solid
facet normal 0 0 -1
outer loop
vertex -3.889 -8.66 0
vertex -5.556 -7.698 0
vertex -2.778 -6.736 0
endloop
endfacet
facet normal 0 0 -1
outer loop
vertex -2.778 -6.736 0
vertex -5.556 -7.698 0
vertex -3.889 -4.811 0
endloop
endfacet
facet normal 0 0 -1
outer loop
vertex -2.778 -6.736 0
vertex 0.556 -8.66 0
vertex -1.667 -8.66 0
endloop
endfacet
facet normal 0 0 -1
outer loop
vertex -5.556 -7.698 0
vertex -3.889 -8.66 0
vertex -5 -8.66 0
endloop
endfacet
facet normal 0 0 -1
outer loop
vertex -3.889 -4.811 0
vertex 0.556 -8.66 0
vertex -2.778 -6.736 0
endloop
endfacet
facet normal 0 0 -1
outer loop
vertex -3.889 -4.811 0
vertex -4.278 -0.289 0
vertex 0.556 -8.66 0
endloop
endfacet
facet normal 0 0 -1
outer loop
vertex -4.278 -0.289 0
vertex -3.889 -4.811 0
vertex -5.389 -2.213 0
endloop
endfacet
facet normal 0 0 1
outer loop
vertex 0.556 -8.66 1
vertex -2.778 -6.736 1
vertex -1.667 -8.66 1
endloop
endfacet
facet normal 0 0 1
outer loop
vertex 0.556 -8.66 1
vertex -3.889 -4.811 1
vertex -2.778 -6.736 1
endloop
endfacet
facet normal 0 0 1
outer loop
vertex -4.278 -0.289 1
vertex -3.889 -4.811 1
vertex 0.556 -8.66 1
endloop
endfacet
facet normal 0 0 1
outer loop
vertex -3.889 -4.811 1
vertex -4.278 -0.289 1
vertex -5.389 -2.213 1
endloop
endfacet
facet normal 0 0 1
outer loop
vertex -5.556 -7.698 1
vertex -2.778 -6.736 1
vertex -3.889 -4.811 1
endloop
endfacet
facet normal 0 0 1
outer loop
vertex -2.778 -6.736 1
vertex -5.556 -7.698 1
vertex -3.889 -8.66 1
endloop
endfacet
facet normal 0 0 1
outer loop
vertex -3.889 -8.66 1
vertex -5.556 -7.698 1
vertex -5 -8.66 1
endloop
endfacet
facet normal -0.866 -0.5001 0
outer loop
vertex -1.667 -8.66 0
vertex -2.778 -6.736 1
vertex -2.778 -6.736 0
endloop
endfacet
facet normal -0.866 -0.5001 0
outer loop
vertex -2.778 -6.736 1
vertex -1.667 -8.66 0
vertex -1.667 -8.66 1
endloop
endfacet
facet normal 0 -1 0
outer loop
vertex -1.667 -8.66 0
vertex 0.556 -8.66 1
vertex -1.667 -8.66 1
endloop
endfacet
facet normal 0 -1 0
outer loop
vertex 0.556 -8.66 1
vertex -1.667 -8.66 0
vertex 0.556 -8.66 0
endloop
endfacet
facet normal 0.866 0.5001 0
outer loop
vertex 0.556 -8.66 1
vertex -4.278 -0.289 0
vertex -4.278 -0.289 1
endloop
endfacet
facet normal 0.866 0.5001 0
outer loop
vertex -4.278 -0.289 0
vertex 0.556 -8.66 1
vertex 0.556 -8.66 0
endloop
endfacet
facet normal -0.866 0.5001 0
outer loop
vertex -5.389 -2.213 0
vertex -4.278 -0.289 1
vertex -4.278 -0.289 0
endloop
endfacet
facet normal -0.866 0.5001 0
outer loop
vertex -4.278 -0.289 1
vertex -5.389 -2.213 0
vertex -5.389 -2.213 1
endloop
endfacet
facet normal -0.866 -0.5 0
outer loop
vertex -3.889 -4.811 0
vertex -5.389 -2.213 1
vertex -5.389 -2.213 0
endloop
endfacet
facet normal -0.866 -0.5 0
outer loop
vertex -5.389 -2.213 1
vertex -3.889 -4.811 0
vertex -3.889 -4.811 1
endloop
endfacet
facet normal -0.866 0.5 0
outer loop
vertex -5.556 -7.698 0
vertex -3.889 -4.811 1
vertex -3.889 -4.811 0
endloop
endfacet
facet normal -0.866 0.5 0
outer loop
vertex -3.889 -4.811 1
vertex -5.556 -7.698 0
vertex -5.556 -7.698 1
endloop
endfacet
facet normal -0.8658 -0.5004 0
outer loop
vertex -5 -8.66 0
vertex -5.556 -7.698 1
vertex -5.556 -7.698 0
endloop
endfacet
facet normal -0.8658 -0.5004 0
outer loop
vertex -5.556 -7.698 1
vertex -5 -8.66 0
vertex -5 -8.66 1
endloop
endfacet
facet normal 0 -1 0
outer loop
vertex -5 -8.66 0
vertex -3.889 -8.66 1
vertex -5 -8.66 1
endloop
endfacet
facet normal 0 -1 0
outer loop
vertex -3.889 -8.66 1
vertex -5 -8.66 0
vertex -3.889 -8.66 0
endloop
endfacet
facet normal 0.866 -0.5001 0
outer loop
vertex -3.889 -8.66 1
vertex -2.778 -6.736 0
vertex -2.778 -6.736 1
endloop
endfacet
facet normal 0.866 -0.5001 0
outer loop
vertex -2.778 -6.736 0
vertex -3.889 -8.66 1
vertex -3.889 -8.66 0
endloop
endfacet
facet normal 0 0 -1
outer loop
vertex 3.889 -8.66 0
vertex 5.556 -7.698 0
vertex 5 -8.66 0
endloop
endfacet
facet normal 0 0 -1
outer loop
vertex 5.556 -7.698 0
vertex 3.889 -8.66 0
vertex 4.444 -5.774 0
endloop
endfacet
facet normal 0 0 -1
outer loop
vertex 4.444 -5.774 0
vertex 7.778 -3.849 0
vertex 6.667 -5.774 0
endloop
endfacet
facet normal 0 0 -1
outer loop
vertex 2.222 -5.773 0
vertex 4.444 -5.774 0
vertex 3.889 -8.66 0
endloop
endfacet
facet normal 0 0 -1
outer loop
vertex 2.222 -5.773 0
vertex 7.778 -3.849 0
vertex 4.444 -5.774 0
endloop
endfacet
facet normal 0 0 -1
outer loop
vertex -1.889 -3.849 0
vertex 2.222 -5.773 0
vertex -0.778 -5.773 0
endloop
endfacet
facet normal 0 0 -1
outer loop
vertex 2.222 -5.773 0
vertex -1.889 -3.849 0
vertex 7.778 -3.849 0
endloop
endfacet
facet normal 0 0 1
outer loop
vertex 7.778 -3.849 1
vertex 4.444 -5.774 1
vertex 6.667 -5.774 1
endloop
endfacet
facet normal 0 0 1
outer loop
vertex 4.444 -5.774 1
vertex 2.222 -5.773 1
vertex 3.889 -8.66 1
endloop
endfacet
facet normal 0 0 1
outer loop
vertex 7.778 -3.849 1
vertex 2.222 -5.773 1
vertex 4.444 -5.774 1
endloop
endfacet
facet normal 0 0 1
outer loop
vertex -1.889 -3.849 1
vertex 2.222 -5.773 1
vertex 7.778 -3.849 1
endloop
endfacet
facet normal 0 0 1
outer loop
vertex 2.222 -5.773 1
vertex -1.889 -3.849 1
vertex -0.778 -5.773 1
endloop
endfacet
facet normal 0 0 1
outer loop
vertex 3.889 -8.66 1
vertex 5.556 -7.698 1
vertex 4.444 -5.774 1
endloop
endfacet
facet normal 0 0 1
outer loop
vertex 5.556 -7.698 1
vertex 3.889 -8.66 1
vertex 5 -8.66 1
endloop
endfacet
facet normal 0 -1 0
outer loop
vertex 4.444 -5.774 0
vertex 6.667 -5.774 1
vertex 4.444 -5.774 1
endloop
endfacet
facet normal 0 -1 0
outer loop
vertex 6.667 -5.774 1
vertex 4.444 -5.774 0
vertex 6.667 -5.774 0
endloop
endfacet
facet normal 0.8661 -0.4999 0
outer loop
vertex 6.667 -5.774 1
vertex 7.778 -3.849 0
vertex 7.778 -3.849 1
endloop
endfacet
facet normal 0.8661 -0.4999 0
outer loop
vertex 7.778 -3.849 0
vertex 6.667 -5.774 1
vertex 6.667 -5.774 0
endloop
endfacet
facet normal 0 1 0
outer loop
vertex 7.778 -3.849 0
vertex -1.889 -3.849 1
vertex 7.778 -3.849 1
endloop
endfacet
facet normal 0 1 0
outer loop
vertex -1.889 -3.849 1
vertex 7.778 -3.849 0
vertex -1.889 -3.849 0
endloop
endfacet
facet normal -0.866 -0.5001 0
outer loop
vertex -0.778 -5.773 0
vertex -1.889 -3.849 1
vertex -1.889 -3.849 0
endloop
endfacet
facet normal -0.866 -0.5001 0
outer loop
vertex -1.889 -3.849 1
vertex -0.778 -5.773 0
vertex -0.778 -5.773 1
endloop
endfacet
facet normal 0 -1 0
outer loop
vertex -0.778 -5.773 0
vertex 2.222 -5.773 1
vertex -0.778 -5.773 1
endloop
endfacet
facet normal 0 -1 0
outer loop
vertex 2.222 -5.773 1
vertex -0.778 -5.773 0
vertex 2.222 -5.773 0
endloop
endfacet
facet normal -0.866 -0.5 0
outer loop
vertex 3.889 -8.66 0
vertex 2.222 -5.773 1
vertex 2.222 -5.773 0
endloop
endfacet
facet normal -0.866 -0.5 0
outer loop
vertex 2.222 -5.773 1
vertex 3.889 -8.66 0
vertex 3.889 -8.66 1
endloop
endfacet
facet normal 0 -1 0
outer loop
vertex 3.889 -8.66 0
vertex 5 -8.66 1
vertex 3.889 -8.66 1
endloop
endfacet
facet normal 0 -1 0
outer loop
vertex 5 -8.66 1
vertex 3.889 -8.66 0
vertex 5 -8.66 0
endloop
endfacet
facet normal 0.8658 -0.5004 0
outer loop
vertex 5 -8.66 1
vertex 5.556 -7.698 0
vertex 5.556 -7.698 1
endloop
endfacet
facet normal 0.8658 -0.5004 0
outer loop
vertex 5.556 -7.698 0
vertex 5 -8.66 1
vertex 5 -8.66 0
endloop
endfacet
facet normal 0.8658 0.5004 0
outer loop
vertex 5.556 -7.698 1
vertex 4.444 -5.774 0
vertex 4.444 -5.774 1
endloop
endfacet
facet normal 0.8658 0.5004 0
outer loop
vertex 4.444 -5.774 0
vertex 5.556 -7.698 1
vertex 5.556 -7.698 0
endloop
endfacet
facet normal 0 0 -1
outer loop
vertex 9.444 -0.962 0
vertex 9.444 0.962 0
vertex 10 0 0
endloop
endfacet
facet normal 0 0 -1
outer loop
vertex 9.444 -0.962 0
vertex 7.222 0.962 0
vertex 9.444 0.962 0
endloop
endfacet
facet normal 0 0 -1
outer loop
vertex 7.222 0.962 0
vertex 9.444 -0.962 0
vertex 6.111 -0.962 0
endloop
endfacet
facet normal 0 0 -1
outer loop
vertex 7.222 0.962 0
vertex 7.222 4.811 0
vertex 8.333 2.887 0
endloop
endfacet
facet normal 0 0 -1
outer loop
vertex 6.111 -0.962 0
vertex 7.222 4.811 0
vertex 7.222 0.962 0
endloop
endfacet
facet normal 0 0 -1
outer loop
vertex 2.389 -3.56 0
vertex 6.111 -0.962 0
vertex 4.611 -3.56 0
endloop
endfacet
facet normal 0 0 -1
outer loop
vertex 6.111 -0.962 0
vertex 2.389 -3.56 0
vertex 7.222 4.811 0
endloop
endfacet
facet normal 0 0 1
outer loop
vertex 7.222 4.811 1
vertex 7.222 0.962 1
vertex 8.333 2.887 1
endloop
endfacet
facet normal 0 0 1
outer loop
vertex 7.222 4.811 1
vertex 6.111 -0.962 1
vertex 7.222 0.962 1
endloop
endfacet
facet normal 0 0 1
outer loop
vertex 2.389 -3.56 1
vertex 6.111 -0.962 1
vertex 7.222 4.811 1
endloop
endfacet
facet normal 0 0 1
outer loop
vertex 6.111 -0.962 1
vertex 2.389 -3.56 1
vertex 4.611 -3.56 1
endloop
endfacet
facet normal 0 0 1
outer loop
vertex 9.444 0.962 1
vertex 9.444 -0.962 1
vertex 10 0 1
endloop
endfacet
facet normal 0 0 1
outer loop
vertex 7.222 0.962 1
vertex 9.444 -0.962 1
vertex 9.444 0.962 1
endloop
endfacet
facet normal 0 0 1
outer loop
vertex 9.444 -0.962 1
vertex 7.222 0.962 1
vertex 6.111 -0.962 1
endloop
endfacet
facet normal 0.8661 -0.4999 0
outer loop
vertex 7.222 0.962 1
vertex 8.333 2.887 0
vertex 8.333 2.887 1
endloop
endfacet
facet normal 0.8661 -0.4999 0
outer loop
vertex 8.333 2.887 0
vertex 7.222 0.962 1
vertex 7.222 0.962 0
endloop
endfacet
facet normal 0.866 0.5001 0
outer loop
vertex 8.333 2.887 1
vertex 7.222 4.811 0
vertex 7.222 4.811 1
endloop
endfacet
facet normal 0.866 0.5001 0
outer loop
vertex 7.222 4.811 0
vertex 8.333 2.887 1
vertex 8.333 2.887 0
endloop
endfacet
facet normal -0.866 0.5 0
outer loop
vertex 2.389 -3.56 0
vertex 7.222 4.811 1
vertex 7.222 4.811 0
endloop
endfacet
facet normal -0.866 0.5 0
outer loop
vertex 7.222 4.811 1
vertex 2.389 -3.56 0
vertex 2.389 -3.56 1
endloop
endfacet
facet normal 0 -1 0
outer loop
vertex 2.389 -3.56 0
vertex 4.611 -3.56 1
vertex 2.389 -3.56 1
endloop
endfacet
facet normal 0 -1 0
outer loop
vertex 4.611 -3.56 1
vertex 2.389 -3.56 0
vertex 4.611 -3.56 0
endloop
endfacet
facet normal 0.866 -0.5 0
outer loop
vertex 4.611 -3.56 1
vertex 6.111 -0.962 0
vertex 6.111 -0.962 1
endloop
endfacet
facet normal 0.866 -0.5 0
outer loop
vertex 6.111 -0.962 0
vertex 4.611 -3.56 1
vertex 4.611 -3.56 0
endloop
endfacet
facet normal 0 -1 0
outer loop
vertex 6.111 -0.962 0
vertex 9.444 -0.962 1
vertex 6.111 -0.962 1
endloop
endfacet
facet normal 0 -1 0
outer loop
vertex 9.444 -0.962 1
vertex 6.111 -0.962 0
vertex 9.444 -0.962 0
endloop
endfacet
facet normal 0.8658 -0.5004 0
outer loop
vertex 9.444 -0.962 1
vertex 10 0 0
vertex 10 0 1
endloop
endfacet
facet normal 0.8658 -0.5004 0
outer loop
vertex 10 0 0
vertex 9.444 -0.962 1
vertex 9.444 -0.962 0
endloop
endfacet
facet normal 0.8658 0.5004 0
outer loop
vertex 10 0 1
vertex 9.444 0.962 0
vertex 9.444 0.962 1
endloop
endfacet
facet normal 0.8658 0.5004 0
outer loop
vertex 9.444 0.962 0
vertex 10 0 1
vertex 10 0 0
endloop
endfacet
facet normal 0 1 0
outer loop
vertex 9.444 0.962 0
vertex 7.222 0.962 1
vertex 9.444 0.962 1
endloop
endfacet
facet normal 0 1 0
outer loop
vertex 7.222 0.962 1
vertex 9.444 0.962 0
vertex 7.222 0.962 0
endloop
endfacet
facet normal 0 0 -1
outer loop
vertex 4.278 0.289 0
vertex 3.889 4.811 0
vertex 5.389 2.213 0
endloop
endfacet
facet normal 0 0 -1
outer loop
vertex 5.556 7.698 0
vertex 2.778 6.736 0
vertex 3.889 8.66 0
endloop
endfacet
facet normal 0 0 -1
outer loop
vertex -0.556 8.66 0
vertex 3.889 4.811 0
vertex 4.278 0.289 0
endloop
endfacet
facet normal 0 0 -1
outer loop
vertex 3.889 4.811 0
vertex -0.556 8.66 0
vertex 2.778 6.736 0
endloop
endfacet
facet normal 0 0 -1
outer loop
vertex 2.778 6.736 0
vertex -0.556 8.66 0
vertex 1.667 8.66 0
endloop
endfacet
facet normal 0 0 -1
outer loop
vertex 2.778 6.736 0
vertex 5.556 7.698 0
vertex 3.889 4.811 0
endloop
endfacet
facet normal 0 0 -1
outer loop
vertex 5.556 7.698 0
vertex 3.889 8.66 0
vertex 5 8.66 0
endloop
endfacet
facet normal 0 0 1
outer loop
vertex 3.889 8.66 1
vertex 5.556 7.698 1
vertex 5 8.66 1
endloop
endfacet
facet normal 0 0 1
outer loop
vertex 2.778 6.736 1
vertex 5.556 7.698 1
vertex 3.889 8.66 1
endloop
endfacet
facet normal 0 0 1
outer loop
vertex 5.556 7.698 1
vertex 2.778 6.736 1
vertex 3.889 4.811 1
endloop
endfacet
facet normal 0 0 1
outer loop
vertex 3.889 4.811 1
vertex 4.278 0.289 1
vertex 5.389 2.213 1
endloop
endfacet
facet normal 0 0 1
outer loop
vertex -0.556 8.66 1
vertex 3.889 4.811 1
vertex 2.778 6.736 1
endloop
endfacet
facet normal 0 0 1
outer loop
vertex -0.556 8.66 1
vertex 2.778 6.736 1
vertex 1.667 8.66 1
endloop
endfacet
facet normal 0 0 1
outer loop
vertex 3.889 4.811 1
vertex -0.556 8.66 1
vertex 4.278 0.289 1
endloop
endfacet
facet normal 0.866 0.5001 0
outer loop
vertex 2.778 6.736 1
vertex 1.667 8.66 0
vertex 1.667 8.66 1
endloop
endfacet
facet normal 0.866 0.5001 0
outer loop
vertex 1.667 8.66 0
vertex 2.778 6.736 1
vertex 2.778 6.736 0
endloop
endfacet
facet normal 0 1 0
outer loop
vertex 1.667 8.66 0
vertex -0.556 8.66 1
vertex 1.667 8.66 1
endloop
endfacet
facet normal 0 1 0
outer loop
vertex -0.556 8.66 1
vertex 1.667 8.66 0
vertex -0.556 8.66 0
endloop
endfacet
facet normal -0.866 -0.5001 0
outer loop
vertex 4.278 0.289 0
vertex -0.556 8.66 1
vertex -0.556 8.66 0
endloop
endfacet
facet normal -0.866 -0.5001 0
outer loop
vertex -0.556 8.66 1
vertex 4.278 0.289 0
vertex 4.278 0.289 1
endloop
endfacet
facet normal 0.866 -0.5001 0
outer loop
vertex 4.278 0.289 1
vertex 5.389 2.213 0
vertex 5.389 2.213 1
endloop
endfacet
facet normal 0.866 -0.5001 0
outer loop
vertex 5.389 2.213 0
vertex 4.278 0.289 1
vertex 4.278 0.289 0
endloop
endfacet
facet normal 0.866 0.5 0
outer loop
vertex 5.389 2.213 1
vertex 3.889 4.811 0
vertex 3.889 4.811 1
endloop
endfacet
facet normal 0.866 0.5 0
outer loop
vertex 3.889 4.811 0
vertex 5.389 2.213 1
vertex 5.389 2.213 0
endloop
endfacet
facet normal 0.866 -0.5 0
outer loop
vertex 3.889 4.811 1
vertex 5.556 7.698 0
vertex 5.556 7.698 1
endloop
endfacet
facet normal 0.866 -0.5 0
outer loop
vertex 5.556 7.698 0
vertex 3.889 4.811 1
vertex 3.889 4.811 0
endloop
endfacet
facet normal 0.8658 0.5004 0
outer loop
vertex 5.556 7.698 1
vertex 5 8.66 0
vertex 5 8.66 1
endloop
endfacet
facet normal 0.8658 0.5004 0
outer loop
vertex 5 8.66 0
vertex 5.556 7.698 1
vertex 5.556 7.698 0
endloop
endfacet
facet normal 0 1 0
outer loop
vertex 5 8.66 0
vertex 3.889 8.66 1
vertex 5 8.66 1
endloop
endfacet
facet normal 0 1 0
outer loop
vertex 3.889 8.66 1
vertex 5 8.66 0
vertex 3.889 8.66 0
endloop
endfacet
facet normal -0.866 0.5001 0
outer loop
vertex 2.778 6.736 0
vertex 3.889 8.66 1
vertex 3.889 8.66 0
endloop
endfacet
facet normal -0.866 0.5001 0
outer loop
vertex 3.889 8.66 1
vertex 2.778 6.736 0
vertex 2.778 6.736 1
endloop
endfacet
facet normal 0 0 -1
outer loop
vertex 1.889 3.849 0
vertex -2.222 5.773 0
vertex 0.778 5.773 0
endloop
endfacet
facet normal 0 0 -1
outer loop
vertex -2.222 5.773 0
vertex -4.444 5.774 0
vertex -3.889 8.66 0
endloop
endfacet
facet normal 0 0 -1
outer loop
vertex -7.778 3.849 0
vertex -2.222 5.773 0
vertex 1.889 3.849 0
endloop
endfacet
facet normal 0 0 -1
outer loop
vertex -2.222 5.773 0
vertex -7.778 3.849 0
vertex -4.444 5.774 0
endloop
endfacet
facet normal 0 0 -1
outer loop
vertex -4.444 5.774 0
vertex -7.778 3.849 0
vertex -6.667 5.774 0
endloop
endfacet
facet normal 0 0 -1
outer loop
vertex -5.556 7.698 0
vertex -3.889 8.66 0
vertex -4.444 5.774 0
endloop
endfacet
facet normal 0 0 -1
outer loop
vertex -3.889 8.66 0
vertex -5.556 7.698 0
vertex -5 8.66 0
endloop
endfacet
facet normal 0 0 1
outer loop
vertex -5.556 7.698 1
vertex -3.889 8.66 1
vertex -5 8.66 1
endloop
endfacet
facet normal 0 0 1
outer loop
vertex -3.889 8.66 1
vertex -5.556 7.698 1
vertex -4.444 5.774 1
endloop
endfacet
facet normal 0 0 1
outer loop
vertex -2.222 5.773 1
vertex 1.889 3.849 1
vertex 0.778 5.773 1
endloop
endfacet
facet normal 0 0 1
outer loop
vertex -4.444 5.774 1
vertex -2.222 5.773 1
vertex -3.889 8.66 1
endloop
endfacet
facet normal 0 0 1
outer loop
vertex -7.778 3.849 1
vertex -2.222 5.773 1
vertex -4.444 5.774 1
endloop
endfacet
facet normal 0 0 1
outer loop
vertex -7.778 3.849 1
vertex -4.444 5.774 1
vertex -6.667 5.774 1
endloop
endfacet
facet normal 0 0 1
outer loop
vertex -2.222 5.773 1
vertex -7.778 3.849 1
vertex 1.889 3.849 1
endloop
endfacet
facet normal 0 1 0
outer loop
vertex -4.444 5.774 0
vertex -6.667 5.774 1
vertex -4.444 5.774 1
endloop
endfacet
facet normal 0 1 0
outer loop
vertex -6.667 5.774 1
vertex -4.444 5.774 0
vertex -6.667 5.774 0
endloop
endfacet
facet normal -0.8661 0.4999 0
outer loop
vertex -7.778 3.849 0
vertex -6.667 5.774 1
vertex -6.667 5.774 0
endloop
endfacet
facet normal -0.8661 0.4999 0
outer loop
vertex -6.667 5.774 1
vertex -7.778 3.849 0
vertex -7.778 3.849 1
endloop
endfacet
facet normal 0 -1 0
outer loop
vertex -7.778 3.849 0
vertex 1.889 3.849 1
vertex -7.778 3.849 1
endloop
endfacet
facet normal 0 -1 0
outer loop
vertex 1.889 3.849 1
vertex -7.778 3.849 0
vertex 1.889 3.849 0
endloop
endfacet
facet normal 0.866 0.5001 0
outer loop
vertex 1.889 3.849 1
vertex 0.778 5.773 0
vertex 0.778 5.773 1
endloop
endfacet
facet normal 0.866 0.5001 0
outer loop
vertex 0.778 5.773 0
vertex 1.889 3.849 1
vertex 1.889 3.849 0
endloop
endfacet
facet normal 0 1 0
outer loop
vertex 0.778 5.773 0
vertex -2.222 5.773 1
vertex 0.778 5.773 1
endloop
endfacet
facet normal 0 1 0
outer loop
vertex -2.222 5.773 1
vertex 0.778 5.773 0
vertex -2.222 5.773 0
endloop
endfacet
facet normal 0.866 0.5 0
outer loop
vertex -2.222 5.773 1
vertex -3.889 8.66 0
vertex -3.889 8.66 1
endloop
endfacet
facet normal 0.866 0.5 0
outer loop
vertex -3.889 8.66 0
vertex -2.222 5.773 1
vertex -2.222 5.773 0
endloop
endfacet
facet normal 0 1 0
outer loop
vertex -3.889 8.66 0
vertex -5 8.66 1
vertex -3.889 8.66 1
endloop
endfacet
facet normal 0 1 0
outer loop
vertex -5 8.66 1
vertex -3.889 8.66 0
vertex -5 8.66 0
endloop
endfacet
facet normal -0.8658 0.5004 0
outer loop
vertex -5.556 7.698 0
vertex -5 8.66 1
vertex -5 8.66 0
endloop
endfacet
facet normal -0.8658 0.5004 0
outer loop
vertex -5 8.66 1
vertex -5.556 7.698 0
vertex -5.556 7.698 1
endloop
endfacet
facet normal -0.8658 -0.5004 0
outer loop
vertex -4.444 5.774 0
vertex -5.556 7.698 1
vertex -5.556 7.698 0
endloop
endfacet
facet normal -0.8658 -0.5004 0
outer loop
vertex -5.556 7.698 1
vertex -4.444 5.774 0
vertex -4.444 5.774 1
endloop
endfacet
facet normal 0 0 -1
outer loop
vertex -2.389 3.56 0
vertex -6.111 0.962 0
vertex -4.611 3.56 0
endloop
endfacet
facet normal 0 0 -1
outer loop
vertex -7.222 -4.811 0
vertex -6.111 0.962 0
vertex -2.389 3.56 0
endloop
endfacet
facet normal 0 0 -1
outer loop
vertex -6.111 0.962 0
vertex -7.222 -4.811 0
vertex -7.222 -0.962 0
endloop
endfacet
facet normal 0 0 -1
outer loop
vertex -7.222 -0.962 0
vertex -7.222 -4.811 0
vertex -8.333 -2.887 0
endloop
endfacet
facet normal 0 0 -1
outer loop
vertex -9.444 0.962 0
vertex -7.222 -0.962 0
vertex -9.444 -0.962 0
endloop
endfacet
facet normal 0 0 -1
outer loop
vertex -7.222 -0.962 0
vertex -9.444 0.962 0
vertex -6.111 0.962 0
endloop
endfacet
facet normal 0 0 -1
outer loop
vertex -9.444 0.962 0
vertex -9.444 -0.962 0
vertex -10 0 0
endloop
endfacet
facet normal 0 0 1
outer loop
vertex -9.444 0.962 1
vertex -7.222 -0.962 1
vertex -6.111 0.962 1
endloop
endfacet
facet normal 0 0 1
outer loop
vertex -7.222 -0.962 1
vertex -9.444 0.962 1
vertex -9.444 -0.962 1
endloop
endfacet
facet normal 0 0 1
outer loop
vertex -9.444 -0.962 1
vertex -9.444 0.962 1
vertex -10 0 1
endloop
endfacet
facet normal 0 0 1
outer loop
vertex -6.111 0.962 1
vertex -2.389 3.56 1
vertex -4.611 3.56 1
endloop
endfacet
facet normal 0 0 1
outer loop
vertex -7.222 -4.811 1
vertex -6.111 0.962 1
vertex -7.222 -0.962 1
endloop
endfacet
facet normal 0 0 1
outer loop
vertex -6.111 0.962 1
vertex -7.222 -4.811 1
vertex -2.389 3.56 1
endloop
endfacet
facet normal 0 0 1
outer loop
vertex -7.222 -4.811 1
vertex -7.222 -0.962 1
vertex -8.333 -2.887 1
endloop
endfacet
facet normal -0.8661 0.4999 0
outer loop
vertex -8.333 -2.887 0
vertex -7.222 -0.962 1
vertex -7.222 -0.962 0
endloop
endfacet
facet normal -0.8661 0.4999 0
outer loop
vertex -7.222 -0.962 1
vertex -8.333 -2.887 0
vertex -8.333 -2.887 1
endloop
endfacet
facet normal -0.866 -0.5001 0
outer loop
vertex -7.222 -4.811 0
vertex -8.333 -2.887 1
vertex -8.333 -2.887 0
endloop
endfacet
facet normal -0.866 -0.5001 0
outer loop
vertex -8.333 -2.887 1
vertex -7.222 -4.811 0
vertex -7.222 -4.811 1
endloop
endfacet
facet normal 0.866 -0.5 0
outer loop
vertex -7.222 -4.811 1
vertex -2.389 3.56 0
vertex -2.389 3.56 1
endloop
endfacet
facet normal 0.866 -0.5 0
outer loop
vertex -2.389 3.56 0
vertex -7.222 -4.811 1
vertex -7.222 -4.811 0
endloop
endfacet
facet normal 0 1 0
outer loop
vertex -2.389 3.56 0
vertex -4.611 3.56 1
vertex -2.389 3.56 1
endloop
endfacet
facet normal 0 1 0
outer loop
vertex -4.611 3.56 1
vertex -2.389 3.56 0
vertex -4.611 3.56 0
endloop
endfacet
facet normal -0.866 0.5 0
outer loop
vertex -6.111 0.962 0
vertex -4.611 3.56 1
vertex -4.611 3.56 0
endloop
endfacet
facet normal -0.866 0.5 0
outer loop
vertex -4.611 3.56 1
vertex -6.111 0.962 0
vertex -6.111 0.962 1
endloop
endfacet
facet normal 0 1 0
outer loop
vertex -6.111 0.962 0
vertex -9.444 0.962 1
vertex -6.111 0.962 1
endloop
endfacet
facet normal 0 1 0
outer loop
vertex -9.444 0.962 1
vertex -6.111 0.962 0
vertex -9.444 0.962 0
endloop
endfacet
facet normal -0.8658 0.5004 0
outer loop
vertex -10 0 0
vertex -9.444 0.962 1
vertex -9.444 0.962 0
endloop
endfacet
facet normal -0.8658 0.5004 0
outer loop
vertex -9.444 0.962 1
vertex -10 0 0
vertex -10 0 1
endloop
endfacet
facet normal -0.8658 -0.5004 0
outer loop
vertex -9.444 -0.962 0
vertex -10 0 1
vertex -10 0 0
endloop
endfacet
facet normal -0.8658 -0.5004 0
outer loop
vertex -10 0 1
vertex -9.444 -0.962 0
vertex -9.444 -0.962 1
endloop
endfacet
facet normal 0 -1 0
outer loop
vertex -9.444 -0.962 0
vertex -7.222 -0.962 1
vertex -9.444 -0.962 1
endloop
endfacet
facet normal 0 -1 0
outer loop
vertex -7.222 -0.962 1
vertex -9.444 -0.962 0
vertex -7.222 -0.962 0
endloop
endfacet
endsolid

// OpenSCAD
unit = [1, 0];
origin = [0, 0];


/*
    Returns a 2D rotation matrix given an angle.
*/
function rot2d(angle) = [
    [+cos(angle), -sin(angle)],
    [+sin(angle), +cos(angle)]
];


/*
    Calculates the points for a hexagon.
    Used to reference off of for creating the lambda.
    Points are created starting from the right and moving counter-clockwise.

         2   1

      3         0

         4   5
*/
function inner_hex_points(data) = [
    for (angle = [0 : 60 : 300]) 
    dict_get(data, "scale") * rot2d(angle) * unit
];



/*
    Calculates the points for making a lambda.

    Returns two a list of two lists.
    The first list contains the offset for making a flake.
    The second list is used to form the lambda polygon.
*/
function lambda_points(data) =
let (
    hex_points = inner_hex_points(data),
    thickness = dict_get(data, "thickness") / 2,
    top_left = hex_points[2],
    bottom_left = hex_points[4],
    bottom_right = hex_points[5],
    v_0 = thickness * unit,
    v_p60 = thickness * rot2d(60) * unit,
    v_n60 = thickness * rot2d(-60) * unit,
    v_n90 = thickness * rot2d(-90) * unit,
    gap = dict_get(data, "gap") * rot2d(-60) * unit
)
[
    [
        top_left + v_p60,
    ],
    [
        top_left - v_p60 + gap,
        top_left + v_p60 + gap,
        bottom_right + v_0,
        bottom_right - v_0,
        sqrt(3) * v_n90,
        bottom_left + v_0,
        bottom_left,
        bottom_left - v_n60,
        -v_0
    ]
];


/*
    Generates a single lambda at the origin.
*/
module lambda(data) {
    new_data = update_params(data);
    linear_extrude(dict_get(new_data, "height"))
    polygon(lambda_points(new_data)[1]);
}


/*
    Generates a NixOS flake.
*/
module flake(data) {
    new_data = update_params(data);
    colors = dict_get(data, "colors");
    echo(colors);
    for (idx = [0 : 5]) {
        color(colors[idx % len(colors)])
        rotate([0, 0, idx * 60]) 
        translate(-lambda_points(new_data)[0][0])
        translate([-dict_get(new_data, "scale"), 0, 0])
        linear_extrude(dict_get(new_data, "height"))
        polygon(lambda_points(new_data)[1]);
    }
}


/*
    Returns the value from a associative array/dictionary type structure given some key.

    Values can be of any type.
    The dictionary must of be of the form:
    [
        [ "key0", <value0> ],
        [ "key1", <value1> ],
        ...
    ]
*/
function dict_get(dict, key) =
  dict[search([key], dict)[0]][1];


/*
    Updates the user parameters so the flake is unit size when `scale = 1`.
*/
function update_params(data) = let
    // factor was empirically found. It gives a flake that is circumscribed by the unit circle.
    (factor = 2.25) [
    [ "gap", 0.75 * dict_get(data, "scale") * dict_get(data, "gap") / factor ],
    [ "height", dict_get(data, "height") ],
    [ "scale", dict_get(data, "scale") / factor ],
    [ "thickness", dict_get(data, "scale") * dict_get(data, "thickness") / factor ],
];


/*
    The parameters for generating a NixOS flake.

    `gap` - The gap between lambdas.
    `height` - The z-height of the flake.
    `scale` - The radial (x,y) size of the flake.
    `thickness` - The thickness of the lambda legs.

    `scale` updates `gap` and `thickness` so there is no need to compesate these values.
    A `gap` of 0 will leave no gap between the lambdas.
    A `gap` of 1 will remove the top portion of the long lambda leg until the point where the two lambda legs intersect.

    A `gap` of 0.05 to 0.15 is a good value for replicating the official NixOS flake.
    A `thickness` of 0.5 is a good value for replicating the official NixOS flake.
    OpenSCAD doesn't have a concept of units so use `scale` and `height` values in the desired ratio.
*/
params = [
    [ "gap", 0.1 ],
    [ "height", 1 ],
    [ "scale", 10 ],
    [ "thickness", 0.5 ],
    [ "colors", ["#5277C3", "#7EBAE4"]],
];


flake(params);
